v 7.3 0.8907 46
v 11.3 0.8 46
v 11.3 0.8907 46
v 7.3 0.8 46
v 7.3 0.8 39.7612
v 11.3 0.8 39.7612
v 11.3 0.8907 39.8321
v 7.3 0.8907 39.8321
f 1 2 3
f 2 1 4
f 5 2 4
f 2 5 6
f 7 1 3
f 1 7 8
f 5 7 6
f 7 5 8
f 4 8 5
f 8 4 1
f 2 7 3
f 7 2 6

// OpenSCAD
// The z-slider's Z lock nut must not spin: a real nut (5.4 AF, measured)
// turned 8 deg from corner-down, swept up through the open top of its
// pocket, must hit the pocket walls. Must render NON-empty.
include <../stage.scad>
af = 5.4;
lz = zs_z0 + zs_h - 5;
x1 = xs_xc + zs_w / 2;
intersection() {
  stage_z_slider();
  hull() for (dz = [0, zs_h])
    translate([x1 - 2.5 - (lock_nut_t + 0.4) / 2, col_y1 + 2, lz + dz]) rotate([0, 90, 0]) rotate([0, 0, 8])
      cylinder(d = af / cos(30), h = 4, center = true, $fn = 6);
}
